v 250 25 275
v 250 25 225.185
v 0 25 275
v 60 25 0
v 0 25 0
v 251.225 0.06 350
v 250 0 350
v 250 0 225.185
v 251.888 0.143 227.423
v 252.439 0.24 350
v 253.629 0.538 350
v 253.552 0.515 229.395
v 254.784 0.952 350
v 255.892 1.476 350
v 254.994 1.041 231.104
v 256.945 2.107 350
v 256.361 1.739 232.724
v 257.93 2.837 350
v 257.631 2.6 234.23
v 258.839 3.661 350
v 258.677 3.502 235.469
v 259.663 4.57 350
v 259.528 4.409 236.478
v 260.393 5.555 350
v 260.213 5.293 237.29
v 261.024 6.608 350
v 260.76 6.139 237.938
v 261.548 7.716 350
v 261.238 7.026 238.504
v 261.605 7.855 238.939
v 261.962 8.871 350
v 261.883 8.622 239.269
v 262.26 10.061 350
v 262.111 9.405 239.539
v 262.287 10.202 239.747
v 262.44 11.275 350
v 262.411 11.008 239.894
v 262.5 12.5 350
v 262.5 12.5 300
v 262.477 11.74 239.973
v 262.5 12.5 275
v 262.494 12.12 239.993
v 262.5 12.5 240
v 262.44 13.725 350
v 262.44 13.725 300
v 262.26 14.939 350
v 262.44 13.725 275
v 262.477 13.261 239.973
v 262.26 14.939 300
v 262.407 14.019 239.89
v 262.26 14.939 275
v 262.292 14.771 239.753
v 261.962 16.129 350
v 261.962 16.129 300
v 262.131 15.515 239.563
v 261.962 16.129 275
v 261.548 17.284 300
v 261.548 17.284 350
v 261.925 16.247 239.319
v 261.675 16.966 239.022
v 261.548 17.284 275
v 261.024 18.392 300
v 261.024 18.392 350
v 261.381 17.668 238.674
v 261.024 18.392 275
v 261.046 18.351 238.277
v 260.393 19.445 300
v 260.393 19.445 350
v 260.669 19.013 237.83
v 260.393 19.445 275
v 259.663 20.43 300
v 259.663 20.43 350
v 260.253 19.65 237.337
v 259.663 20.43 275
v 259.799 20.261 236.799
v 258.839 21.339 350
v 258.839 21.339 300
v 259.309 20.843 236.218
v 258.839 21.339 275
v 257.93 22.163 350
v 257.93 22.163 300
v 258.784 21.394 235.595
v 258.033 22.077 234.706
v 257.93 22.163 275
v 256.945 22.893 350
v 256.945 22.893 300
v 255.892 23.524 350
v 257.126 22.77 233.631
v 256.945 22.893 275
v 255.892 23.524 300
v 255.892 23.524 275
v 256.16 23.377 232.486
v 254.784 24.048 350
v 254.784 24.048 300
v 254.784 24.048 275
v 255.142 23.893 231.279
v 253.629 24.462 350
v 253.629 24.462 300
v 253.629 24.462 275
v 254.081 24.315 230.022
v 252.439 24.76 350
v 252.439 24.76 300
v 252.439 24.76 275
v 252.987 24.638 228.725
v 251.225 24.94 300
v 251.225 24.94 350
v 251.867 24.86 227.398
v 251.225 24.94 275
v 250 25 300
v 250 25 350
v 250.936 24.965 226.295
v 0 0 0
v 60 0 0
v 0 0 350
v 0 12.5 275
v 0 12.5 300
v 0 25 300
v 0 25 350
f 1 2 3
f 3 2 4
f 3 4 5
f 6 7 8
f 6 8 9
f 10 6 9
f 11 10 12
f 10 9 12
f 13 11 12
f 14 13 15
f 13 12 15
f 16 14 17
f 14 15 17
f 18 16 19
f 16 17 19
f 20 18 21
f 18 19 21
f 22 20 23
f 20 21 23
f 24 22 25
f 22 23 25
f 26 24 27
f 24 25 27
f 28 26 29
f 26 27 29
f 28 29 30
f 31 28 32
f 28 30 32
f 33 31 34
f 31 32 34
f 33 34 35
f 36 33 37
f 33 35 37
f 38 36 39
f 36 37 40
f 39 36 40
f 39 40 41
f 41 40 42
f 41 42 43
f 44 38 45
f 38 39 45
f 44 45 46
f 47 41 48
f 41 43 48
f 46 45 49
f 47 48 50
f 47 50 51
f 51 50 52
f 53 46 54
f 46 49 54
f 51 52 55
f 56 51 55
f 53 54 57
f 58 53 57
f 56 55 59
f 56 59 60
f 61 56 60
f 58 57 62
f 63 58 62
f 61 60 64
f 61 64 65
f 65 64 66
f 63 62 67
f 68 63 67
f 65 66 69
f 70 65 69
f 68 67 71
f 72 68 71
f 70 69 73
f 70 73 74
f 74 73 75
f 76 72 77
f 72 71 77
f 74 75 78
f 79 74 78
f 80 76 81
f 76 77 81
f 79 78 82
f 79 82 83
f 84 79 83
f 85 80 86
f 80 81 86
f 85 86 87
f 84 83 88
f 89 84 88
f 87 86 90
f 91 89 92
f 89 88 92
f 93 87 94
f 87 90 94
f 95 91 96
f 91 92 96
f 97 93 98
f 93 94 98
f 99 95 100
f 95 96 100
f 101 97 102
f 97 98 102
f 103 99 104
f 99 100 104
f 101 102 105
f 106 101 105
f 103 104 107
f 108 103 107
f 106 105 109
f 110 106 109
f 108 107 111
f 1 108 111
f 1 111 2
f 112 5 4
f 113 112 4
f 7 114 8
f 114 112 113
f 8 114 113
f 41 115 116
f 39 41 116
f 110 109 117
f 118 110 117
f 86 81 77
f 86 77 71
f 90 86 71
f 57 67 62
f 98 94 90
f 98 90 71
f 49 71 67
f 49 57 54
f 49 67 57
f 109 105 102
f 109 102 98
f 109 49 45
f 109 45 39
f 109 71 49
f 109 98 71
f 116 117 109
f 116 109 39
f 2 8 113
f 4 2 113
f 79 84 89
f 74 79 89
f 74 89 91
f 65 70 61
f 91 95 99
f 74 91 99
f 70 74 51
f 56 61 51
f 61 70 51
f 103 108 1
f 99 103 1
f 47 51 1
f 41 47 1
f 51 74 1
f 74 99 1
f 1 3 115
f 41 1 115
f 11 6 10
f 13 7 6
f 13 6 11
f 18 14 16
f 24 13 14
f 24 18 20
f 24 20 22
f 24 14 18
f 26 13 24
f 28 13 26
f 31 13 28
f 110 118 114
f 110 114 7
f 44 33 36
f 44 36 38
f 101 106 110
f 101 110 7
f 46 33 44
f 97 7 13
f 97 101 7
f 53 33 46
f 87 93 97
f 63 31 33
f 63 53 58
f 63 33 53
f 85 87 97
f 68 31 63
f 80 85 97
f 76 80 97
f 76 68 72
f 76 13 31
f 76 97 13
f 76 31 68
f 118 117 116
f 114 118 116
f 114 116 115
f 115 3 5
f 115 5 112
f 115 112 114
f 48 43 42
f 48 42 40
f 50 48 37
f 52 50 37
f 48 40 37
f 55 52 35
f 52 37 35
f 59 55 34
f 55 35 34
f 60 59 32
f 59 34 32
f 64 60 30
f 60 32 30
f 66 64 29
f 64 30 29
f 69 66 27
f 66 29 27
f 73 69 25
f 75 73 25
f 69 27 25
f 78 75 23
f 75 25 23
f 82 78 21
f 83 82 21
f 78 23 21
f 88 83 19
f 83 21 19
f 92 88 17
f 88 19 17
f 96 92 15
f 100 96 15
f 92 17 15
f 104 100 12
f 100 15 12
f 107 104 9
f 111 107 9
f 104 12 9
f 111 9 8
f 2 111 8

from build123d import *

# Parameters (mm, degrees)
F1_DEPTH = 350
F2_W     = 12.5
F2_H     = 25
F3_DEPTH = 262.501
F5_DEPTH = 25.001


with BuildPart() as f1:
    # F0 (on Top) → F1 (new body)
    with BuildSketch(Plane.XY):
        with BuildLine():
            Line((0, 25), (0, 0))
            Line((0, 0), (250, 0))
            ThreePointArc((250, 0), (262.5, 12.5), (250, 25))
            Line((250, 25), (0, 25))
        make_face()
    extrude(amount=F1_DEPTH)

    # F2 (on face) → F3 (cut, through all)
    with BuildSketch(Plane(origin=(0, 0, 0), x_dir=(0, -1, 0), z_dir=(-1, 0, 0))):
        with Locations((-18.75, 287.5)):
            Rectangle(F2_W, F2_H)
    extrude(amount=-F3_DEPTH, mode=Mode.SUBTRACT)

    # F4 (on face) → F5 (cut, through all)
    with BuildSketch(Plane.XZ):
        Polygon((250, 0), (250, 225.185185), (60, 0), align=None)
        Polygon((262.5, 0), (262.5, 240), (250, 225.185185), (250, 0), align=None)
    extrude(amount=-F5_DEPTH, mode=Mode.SUBTRACT)


solid = f1.part
